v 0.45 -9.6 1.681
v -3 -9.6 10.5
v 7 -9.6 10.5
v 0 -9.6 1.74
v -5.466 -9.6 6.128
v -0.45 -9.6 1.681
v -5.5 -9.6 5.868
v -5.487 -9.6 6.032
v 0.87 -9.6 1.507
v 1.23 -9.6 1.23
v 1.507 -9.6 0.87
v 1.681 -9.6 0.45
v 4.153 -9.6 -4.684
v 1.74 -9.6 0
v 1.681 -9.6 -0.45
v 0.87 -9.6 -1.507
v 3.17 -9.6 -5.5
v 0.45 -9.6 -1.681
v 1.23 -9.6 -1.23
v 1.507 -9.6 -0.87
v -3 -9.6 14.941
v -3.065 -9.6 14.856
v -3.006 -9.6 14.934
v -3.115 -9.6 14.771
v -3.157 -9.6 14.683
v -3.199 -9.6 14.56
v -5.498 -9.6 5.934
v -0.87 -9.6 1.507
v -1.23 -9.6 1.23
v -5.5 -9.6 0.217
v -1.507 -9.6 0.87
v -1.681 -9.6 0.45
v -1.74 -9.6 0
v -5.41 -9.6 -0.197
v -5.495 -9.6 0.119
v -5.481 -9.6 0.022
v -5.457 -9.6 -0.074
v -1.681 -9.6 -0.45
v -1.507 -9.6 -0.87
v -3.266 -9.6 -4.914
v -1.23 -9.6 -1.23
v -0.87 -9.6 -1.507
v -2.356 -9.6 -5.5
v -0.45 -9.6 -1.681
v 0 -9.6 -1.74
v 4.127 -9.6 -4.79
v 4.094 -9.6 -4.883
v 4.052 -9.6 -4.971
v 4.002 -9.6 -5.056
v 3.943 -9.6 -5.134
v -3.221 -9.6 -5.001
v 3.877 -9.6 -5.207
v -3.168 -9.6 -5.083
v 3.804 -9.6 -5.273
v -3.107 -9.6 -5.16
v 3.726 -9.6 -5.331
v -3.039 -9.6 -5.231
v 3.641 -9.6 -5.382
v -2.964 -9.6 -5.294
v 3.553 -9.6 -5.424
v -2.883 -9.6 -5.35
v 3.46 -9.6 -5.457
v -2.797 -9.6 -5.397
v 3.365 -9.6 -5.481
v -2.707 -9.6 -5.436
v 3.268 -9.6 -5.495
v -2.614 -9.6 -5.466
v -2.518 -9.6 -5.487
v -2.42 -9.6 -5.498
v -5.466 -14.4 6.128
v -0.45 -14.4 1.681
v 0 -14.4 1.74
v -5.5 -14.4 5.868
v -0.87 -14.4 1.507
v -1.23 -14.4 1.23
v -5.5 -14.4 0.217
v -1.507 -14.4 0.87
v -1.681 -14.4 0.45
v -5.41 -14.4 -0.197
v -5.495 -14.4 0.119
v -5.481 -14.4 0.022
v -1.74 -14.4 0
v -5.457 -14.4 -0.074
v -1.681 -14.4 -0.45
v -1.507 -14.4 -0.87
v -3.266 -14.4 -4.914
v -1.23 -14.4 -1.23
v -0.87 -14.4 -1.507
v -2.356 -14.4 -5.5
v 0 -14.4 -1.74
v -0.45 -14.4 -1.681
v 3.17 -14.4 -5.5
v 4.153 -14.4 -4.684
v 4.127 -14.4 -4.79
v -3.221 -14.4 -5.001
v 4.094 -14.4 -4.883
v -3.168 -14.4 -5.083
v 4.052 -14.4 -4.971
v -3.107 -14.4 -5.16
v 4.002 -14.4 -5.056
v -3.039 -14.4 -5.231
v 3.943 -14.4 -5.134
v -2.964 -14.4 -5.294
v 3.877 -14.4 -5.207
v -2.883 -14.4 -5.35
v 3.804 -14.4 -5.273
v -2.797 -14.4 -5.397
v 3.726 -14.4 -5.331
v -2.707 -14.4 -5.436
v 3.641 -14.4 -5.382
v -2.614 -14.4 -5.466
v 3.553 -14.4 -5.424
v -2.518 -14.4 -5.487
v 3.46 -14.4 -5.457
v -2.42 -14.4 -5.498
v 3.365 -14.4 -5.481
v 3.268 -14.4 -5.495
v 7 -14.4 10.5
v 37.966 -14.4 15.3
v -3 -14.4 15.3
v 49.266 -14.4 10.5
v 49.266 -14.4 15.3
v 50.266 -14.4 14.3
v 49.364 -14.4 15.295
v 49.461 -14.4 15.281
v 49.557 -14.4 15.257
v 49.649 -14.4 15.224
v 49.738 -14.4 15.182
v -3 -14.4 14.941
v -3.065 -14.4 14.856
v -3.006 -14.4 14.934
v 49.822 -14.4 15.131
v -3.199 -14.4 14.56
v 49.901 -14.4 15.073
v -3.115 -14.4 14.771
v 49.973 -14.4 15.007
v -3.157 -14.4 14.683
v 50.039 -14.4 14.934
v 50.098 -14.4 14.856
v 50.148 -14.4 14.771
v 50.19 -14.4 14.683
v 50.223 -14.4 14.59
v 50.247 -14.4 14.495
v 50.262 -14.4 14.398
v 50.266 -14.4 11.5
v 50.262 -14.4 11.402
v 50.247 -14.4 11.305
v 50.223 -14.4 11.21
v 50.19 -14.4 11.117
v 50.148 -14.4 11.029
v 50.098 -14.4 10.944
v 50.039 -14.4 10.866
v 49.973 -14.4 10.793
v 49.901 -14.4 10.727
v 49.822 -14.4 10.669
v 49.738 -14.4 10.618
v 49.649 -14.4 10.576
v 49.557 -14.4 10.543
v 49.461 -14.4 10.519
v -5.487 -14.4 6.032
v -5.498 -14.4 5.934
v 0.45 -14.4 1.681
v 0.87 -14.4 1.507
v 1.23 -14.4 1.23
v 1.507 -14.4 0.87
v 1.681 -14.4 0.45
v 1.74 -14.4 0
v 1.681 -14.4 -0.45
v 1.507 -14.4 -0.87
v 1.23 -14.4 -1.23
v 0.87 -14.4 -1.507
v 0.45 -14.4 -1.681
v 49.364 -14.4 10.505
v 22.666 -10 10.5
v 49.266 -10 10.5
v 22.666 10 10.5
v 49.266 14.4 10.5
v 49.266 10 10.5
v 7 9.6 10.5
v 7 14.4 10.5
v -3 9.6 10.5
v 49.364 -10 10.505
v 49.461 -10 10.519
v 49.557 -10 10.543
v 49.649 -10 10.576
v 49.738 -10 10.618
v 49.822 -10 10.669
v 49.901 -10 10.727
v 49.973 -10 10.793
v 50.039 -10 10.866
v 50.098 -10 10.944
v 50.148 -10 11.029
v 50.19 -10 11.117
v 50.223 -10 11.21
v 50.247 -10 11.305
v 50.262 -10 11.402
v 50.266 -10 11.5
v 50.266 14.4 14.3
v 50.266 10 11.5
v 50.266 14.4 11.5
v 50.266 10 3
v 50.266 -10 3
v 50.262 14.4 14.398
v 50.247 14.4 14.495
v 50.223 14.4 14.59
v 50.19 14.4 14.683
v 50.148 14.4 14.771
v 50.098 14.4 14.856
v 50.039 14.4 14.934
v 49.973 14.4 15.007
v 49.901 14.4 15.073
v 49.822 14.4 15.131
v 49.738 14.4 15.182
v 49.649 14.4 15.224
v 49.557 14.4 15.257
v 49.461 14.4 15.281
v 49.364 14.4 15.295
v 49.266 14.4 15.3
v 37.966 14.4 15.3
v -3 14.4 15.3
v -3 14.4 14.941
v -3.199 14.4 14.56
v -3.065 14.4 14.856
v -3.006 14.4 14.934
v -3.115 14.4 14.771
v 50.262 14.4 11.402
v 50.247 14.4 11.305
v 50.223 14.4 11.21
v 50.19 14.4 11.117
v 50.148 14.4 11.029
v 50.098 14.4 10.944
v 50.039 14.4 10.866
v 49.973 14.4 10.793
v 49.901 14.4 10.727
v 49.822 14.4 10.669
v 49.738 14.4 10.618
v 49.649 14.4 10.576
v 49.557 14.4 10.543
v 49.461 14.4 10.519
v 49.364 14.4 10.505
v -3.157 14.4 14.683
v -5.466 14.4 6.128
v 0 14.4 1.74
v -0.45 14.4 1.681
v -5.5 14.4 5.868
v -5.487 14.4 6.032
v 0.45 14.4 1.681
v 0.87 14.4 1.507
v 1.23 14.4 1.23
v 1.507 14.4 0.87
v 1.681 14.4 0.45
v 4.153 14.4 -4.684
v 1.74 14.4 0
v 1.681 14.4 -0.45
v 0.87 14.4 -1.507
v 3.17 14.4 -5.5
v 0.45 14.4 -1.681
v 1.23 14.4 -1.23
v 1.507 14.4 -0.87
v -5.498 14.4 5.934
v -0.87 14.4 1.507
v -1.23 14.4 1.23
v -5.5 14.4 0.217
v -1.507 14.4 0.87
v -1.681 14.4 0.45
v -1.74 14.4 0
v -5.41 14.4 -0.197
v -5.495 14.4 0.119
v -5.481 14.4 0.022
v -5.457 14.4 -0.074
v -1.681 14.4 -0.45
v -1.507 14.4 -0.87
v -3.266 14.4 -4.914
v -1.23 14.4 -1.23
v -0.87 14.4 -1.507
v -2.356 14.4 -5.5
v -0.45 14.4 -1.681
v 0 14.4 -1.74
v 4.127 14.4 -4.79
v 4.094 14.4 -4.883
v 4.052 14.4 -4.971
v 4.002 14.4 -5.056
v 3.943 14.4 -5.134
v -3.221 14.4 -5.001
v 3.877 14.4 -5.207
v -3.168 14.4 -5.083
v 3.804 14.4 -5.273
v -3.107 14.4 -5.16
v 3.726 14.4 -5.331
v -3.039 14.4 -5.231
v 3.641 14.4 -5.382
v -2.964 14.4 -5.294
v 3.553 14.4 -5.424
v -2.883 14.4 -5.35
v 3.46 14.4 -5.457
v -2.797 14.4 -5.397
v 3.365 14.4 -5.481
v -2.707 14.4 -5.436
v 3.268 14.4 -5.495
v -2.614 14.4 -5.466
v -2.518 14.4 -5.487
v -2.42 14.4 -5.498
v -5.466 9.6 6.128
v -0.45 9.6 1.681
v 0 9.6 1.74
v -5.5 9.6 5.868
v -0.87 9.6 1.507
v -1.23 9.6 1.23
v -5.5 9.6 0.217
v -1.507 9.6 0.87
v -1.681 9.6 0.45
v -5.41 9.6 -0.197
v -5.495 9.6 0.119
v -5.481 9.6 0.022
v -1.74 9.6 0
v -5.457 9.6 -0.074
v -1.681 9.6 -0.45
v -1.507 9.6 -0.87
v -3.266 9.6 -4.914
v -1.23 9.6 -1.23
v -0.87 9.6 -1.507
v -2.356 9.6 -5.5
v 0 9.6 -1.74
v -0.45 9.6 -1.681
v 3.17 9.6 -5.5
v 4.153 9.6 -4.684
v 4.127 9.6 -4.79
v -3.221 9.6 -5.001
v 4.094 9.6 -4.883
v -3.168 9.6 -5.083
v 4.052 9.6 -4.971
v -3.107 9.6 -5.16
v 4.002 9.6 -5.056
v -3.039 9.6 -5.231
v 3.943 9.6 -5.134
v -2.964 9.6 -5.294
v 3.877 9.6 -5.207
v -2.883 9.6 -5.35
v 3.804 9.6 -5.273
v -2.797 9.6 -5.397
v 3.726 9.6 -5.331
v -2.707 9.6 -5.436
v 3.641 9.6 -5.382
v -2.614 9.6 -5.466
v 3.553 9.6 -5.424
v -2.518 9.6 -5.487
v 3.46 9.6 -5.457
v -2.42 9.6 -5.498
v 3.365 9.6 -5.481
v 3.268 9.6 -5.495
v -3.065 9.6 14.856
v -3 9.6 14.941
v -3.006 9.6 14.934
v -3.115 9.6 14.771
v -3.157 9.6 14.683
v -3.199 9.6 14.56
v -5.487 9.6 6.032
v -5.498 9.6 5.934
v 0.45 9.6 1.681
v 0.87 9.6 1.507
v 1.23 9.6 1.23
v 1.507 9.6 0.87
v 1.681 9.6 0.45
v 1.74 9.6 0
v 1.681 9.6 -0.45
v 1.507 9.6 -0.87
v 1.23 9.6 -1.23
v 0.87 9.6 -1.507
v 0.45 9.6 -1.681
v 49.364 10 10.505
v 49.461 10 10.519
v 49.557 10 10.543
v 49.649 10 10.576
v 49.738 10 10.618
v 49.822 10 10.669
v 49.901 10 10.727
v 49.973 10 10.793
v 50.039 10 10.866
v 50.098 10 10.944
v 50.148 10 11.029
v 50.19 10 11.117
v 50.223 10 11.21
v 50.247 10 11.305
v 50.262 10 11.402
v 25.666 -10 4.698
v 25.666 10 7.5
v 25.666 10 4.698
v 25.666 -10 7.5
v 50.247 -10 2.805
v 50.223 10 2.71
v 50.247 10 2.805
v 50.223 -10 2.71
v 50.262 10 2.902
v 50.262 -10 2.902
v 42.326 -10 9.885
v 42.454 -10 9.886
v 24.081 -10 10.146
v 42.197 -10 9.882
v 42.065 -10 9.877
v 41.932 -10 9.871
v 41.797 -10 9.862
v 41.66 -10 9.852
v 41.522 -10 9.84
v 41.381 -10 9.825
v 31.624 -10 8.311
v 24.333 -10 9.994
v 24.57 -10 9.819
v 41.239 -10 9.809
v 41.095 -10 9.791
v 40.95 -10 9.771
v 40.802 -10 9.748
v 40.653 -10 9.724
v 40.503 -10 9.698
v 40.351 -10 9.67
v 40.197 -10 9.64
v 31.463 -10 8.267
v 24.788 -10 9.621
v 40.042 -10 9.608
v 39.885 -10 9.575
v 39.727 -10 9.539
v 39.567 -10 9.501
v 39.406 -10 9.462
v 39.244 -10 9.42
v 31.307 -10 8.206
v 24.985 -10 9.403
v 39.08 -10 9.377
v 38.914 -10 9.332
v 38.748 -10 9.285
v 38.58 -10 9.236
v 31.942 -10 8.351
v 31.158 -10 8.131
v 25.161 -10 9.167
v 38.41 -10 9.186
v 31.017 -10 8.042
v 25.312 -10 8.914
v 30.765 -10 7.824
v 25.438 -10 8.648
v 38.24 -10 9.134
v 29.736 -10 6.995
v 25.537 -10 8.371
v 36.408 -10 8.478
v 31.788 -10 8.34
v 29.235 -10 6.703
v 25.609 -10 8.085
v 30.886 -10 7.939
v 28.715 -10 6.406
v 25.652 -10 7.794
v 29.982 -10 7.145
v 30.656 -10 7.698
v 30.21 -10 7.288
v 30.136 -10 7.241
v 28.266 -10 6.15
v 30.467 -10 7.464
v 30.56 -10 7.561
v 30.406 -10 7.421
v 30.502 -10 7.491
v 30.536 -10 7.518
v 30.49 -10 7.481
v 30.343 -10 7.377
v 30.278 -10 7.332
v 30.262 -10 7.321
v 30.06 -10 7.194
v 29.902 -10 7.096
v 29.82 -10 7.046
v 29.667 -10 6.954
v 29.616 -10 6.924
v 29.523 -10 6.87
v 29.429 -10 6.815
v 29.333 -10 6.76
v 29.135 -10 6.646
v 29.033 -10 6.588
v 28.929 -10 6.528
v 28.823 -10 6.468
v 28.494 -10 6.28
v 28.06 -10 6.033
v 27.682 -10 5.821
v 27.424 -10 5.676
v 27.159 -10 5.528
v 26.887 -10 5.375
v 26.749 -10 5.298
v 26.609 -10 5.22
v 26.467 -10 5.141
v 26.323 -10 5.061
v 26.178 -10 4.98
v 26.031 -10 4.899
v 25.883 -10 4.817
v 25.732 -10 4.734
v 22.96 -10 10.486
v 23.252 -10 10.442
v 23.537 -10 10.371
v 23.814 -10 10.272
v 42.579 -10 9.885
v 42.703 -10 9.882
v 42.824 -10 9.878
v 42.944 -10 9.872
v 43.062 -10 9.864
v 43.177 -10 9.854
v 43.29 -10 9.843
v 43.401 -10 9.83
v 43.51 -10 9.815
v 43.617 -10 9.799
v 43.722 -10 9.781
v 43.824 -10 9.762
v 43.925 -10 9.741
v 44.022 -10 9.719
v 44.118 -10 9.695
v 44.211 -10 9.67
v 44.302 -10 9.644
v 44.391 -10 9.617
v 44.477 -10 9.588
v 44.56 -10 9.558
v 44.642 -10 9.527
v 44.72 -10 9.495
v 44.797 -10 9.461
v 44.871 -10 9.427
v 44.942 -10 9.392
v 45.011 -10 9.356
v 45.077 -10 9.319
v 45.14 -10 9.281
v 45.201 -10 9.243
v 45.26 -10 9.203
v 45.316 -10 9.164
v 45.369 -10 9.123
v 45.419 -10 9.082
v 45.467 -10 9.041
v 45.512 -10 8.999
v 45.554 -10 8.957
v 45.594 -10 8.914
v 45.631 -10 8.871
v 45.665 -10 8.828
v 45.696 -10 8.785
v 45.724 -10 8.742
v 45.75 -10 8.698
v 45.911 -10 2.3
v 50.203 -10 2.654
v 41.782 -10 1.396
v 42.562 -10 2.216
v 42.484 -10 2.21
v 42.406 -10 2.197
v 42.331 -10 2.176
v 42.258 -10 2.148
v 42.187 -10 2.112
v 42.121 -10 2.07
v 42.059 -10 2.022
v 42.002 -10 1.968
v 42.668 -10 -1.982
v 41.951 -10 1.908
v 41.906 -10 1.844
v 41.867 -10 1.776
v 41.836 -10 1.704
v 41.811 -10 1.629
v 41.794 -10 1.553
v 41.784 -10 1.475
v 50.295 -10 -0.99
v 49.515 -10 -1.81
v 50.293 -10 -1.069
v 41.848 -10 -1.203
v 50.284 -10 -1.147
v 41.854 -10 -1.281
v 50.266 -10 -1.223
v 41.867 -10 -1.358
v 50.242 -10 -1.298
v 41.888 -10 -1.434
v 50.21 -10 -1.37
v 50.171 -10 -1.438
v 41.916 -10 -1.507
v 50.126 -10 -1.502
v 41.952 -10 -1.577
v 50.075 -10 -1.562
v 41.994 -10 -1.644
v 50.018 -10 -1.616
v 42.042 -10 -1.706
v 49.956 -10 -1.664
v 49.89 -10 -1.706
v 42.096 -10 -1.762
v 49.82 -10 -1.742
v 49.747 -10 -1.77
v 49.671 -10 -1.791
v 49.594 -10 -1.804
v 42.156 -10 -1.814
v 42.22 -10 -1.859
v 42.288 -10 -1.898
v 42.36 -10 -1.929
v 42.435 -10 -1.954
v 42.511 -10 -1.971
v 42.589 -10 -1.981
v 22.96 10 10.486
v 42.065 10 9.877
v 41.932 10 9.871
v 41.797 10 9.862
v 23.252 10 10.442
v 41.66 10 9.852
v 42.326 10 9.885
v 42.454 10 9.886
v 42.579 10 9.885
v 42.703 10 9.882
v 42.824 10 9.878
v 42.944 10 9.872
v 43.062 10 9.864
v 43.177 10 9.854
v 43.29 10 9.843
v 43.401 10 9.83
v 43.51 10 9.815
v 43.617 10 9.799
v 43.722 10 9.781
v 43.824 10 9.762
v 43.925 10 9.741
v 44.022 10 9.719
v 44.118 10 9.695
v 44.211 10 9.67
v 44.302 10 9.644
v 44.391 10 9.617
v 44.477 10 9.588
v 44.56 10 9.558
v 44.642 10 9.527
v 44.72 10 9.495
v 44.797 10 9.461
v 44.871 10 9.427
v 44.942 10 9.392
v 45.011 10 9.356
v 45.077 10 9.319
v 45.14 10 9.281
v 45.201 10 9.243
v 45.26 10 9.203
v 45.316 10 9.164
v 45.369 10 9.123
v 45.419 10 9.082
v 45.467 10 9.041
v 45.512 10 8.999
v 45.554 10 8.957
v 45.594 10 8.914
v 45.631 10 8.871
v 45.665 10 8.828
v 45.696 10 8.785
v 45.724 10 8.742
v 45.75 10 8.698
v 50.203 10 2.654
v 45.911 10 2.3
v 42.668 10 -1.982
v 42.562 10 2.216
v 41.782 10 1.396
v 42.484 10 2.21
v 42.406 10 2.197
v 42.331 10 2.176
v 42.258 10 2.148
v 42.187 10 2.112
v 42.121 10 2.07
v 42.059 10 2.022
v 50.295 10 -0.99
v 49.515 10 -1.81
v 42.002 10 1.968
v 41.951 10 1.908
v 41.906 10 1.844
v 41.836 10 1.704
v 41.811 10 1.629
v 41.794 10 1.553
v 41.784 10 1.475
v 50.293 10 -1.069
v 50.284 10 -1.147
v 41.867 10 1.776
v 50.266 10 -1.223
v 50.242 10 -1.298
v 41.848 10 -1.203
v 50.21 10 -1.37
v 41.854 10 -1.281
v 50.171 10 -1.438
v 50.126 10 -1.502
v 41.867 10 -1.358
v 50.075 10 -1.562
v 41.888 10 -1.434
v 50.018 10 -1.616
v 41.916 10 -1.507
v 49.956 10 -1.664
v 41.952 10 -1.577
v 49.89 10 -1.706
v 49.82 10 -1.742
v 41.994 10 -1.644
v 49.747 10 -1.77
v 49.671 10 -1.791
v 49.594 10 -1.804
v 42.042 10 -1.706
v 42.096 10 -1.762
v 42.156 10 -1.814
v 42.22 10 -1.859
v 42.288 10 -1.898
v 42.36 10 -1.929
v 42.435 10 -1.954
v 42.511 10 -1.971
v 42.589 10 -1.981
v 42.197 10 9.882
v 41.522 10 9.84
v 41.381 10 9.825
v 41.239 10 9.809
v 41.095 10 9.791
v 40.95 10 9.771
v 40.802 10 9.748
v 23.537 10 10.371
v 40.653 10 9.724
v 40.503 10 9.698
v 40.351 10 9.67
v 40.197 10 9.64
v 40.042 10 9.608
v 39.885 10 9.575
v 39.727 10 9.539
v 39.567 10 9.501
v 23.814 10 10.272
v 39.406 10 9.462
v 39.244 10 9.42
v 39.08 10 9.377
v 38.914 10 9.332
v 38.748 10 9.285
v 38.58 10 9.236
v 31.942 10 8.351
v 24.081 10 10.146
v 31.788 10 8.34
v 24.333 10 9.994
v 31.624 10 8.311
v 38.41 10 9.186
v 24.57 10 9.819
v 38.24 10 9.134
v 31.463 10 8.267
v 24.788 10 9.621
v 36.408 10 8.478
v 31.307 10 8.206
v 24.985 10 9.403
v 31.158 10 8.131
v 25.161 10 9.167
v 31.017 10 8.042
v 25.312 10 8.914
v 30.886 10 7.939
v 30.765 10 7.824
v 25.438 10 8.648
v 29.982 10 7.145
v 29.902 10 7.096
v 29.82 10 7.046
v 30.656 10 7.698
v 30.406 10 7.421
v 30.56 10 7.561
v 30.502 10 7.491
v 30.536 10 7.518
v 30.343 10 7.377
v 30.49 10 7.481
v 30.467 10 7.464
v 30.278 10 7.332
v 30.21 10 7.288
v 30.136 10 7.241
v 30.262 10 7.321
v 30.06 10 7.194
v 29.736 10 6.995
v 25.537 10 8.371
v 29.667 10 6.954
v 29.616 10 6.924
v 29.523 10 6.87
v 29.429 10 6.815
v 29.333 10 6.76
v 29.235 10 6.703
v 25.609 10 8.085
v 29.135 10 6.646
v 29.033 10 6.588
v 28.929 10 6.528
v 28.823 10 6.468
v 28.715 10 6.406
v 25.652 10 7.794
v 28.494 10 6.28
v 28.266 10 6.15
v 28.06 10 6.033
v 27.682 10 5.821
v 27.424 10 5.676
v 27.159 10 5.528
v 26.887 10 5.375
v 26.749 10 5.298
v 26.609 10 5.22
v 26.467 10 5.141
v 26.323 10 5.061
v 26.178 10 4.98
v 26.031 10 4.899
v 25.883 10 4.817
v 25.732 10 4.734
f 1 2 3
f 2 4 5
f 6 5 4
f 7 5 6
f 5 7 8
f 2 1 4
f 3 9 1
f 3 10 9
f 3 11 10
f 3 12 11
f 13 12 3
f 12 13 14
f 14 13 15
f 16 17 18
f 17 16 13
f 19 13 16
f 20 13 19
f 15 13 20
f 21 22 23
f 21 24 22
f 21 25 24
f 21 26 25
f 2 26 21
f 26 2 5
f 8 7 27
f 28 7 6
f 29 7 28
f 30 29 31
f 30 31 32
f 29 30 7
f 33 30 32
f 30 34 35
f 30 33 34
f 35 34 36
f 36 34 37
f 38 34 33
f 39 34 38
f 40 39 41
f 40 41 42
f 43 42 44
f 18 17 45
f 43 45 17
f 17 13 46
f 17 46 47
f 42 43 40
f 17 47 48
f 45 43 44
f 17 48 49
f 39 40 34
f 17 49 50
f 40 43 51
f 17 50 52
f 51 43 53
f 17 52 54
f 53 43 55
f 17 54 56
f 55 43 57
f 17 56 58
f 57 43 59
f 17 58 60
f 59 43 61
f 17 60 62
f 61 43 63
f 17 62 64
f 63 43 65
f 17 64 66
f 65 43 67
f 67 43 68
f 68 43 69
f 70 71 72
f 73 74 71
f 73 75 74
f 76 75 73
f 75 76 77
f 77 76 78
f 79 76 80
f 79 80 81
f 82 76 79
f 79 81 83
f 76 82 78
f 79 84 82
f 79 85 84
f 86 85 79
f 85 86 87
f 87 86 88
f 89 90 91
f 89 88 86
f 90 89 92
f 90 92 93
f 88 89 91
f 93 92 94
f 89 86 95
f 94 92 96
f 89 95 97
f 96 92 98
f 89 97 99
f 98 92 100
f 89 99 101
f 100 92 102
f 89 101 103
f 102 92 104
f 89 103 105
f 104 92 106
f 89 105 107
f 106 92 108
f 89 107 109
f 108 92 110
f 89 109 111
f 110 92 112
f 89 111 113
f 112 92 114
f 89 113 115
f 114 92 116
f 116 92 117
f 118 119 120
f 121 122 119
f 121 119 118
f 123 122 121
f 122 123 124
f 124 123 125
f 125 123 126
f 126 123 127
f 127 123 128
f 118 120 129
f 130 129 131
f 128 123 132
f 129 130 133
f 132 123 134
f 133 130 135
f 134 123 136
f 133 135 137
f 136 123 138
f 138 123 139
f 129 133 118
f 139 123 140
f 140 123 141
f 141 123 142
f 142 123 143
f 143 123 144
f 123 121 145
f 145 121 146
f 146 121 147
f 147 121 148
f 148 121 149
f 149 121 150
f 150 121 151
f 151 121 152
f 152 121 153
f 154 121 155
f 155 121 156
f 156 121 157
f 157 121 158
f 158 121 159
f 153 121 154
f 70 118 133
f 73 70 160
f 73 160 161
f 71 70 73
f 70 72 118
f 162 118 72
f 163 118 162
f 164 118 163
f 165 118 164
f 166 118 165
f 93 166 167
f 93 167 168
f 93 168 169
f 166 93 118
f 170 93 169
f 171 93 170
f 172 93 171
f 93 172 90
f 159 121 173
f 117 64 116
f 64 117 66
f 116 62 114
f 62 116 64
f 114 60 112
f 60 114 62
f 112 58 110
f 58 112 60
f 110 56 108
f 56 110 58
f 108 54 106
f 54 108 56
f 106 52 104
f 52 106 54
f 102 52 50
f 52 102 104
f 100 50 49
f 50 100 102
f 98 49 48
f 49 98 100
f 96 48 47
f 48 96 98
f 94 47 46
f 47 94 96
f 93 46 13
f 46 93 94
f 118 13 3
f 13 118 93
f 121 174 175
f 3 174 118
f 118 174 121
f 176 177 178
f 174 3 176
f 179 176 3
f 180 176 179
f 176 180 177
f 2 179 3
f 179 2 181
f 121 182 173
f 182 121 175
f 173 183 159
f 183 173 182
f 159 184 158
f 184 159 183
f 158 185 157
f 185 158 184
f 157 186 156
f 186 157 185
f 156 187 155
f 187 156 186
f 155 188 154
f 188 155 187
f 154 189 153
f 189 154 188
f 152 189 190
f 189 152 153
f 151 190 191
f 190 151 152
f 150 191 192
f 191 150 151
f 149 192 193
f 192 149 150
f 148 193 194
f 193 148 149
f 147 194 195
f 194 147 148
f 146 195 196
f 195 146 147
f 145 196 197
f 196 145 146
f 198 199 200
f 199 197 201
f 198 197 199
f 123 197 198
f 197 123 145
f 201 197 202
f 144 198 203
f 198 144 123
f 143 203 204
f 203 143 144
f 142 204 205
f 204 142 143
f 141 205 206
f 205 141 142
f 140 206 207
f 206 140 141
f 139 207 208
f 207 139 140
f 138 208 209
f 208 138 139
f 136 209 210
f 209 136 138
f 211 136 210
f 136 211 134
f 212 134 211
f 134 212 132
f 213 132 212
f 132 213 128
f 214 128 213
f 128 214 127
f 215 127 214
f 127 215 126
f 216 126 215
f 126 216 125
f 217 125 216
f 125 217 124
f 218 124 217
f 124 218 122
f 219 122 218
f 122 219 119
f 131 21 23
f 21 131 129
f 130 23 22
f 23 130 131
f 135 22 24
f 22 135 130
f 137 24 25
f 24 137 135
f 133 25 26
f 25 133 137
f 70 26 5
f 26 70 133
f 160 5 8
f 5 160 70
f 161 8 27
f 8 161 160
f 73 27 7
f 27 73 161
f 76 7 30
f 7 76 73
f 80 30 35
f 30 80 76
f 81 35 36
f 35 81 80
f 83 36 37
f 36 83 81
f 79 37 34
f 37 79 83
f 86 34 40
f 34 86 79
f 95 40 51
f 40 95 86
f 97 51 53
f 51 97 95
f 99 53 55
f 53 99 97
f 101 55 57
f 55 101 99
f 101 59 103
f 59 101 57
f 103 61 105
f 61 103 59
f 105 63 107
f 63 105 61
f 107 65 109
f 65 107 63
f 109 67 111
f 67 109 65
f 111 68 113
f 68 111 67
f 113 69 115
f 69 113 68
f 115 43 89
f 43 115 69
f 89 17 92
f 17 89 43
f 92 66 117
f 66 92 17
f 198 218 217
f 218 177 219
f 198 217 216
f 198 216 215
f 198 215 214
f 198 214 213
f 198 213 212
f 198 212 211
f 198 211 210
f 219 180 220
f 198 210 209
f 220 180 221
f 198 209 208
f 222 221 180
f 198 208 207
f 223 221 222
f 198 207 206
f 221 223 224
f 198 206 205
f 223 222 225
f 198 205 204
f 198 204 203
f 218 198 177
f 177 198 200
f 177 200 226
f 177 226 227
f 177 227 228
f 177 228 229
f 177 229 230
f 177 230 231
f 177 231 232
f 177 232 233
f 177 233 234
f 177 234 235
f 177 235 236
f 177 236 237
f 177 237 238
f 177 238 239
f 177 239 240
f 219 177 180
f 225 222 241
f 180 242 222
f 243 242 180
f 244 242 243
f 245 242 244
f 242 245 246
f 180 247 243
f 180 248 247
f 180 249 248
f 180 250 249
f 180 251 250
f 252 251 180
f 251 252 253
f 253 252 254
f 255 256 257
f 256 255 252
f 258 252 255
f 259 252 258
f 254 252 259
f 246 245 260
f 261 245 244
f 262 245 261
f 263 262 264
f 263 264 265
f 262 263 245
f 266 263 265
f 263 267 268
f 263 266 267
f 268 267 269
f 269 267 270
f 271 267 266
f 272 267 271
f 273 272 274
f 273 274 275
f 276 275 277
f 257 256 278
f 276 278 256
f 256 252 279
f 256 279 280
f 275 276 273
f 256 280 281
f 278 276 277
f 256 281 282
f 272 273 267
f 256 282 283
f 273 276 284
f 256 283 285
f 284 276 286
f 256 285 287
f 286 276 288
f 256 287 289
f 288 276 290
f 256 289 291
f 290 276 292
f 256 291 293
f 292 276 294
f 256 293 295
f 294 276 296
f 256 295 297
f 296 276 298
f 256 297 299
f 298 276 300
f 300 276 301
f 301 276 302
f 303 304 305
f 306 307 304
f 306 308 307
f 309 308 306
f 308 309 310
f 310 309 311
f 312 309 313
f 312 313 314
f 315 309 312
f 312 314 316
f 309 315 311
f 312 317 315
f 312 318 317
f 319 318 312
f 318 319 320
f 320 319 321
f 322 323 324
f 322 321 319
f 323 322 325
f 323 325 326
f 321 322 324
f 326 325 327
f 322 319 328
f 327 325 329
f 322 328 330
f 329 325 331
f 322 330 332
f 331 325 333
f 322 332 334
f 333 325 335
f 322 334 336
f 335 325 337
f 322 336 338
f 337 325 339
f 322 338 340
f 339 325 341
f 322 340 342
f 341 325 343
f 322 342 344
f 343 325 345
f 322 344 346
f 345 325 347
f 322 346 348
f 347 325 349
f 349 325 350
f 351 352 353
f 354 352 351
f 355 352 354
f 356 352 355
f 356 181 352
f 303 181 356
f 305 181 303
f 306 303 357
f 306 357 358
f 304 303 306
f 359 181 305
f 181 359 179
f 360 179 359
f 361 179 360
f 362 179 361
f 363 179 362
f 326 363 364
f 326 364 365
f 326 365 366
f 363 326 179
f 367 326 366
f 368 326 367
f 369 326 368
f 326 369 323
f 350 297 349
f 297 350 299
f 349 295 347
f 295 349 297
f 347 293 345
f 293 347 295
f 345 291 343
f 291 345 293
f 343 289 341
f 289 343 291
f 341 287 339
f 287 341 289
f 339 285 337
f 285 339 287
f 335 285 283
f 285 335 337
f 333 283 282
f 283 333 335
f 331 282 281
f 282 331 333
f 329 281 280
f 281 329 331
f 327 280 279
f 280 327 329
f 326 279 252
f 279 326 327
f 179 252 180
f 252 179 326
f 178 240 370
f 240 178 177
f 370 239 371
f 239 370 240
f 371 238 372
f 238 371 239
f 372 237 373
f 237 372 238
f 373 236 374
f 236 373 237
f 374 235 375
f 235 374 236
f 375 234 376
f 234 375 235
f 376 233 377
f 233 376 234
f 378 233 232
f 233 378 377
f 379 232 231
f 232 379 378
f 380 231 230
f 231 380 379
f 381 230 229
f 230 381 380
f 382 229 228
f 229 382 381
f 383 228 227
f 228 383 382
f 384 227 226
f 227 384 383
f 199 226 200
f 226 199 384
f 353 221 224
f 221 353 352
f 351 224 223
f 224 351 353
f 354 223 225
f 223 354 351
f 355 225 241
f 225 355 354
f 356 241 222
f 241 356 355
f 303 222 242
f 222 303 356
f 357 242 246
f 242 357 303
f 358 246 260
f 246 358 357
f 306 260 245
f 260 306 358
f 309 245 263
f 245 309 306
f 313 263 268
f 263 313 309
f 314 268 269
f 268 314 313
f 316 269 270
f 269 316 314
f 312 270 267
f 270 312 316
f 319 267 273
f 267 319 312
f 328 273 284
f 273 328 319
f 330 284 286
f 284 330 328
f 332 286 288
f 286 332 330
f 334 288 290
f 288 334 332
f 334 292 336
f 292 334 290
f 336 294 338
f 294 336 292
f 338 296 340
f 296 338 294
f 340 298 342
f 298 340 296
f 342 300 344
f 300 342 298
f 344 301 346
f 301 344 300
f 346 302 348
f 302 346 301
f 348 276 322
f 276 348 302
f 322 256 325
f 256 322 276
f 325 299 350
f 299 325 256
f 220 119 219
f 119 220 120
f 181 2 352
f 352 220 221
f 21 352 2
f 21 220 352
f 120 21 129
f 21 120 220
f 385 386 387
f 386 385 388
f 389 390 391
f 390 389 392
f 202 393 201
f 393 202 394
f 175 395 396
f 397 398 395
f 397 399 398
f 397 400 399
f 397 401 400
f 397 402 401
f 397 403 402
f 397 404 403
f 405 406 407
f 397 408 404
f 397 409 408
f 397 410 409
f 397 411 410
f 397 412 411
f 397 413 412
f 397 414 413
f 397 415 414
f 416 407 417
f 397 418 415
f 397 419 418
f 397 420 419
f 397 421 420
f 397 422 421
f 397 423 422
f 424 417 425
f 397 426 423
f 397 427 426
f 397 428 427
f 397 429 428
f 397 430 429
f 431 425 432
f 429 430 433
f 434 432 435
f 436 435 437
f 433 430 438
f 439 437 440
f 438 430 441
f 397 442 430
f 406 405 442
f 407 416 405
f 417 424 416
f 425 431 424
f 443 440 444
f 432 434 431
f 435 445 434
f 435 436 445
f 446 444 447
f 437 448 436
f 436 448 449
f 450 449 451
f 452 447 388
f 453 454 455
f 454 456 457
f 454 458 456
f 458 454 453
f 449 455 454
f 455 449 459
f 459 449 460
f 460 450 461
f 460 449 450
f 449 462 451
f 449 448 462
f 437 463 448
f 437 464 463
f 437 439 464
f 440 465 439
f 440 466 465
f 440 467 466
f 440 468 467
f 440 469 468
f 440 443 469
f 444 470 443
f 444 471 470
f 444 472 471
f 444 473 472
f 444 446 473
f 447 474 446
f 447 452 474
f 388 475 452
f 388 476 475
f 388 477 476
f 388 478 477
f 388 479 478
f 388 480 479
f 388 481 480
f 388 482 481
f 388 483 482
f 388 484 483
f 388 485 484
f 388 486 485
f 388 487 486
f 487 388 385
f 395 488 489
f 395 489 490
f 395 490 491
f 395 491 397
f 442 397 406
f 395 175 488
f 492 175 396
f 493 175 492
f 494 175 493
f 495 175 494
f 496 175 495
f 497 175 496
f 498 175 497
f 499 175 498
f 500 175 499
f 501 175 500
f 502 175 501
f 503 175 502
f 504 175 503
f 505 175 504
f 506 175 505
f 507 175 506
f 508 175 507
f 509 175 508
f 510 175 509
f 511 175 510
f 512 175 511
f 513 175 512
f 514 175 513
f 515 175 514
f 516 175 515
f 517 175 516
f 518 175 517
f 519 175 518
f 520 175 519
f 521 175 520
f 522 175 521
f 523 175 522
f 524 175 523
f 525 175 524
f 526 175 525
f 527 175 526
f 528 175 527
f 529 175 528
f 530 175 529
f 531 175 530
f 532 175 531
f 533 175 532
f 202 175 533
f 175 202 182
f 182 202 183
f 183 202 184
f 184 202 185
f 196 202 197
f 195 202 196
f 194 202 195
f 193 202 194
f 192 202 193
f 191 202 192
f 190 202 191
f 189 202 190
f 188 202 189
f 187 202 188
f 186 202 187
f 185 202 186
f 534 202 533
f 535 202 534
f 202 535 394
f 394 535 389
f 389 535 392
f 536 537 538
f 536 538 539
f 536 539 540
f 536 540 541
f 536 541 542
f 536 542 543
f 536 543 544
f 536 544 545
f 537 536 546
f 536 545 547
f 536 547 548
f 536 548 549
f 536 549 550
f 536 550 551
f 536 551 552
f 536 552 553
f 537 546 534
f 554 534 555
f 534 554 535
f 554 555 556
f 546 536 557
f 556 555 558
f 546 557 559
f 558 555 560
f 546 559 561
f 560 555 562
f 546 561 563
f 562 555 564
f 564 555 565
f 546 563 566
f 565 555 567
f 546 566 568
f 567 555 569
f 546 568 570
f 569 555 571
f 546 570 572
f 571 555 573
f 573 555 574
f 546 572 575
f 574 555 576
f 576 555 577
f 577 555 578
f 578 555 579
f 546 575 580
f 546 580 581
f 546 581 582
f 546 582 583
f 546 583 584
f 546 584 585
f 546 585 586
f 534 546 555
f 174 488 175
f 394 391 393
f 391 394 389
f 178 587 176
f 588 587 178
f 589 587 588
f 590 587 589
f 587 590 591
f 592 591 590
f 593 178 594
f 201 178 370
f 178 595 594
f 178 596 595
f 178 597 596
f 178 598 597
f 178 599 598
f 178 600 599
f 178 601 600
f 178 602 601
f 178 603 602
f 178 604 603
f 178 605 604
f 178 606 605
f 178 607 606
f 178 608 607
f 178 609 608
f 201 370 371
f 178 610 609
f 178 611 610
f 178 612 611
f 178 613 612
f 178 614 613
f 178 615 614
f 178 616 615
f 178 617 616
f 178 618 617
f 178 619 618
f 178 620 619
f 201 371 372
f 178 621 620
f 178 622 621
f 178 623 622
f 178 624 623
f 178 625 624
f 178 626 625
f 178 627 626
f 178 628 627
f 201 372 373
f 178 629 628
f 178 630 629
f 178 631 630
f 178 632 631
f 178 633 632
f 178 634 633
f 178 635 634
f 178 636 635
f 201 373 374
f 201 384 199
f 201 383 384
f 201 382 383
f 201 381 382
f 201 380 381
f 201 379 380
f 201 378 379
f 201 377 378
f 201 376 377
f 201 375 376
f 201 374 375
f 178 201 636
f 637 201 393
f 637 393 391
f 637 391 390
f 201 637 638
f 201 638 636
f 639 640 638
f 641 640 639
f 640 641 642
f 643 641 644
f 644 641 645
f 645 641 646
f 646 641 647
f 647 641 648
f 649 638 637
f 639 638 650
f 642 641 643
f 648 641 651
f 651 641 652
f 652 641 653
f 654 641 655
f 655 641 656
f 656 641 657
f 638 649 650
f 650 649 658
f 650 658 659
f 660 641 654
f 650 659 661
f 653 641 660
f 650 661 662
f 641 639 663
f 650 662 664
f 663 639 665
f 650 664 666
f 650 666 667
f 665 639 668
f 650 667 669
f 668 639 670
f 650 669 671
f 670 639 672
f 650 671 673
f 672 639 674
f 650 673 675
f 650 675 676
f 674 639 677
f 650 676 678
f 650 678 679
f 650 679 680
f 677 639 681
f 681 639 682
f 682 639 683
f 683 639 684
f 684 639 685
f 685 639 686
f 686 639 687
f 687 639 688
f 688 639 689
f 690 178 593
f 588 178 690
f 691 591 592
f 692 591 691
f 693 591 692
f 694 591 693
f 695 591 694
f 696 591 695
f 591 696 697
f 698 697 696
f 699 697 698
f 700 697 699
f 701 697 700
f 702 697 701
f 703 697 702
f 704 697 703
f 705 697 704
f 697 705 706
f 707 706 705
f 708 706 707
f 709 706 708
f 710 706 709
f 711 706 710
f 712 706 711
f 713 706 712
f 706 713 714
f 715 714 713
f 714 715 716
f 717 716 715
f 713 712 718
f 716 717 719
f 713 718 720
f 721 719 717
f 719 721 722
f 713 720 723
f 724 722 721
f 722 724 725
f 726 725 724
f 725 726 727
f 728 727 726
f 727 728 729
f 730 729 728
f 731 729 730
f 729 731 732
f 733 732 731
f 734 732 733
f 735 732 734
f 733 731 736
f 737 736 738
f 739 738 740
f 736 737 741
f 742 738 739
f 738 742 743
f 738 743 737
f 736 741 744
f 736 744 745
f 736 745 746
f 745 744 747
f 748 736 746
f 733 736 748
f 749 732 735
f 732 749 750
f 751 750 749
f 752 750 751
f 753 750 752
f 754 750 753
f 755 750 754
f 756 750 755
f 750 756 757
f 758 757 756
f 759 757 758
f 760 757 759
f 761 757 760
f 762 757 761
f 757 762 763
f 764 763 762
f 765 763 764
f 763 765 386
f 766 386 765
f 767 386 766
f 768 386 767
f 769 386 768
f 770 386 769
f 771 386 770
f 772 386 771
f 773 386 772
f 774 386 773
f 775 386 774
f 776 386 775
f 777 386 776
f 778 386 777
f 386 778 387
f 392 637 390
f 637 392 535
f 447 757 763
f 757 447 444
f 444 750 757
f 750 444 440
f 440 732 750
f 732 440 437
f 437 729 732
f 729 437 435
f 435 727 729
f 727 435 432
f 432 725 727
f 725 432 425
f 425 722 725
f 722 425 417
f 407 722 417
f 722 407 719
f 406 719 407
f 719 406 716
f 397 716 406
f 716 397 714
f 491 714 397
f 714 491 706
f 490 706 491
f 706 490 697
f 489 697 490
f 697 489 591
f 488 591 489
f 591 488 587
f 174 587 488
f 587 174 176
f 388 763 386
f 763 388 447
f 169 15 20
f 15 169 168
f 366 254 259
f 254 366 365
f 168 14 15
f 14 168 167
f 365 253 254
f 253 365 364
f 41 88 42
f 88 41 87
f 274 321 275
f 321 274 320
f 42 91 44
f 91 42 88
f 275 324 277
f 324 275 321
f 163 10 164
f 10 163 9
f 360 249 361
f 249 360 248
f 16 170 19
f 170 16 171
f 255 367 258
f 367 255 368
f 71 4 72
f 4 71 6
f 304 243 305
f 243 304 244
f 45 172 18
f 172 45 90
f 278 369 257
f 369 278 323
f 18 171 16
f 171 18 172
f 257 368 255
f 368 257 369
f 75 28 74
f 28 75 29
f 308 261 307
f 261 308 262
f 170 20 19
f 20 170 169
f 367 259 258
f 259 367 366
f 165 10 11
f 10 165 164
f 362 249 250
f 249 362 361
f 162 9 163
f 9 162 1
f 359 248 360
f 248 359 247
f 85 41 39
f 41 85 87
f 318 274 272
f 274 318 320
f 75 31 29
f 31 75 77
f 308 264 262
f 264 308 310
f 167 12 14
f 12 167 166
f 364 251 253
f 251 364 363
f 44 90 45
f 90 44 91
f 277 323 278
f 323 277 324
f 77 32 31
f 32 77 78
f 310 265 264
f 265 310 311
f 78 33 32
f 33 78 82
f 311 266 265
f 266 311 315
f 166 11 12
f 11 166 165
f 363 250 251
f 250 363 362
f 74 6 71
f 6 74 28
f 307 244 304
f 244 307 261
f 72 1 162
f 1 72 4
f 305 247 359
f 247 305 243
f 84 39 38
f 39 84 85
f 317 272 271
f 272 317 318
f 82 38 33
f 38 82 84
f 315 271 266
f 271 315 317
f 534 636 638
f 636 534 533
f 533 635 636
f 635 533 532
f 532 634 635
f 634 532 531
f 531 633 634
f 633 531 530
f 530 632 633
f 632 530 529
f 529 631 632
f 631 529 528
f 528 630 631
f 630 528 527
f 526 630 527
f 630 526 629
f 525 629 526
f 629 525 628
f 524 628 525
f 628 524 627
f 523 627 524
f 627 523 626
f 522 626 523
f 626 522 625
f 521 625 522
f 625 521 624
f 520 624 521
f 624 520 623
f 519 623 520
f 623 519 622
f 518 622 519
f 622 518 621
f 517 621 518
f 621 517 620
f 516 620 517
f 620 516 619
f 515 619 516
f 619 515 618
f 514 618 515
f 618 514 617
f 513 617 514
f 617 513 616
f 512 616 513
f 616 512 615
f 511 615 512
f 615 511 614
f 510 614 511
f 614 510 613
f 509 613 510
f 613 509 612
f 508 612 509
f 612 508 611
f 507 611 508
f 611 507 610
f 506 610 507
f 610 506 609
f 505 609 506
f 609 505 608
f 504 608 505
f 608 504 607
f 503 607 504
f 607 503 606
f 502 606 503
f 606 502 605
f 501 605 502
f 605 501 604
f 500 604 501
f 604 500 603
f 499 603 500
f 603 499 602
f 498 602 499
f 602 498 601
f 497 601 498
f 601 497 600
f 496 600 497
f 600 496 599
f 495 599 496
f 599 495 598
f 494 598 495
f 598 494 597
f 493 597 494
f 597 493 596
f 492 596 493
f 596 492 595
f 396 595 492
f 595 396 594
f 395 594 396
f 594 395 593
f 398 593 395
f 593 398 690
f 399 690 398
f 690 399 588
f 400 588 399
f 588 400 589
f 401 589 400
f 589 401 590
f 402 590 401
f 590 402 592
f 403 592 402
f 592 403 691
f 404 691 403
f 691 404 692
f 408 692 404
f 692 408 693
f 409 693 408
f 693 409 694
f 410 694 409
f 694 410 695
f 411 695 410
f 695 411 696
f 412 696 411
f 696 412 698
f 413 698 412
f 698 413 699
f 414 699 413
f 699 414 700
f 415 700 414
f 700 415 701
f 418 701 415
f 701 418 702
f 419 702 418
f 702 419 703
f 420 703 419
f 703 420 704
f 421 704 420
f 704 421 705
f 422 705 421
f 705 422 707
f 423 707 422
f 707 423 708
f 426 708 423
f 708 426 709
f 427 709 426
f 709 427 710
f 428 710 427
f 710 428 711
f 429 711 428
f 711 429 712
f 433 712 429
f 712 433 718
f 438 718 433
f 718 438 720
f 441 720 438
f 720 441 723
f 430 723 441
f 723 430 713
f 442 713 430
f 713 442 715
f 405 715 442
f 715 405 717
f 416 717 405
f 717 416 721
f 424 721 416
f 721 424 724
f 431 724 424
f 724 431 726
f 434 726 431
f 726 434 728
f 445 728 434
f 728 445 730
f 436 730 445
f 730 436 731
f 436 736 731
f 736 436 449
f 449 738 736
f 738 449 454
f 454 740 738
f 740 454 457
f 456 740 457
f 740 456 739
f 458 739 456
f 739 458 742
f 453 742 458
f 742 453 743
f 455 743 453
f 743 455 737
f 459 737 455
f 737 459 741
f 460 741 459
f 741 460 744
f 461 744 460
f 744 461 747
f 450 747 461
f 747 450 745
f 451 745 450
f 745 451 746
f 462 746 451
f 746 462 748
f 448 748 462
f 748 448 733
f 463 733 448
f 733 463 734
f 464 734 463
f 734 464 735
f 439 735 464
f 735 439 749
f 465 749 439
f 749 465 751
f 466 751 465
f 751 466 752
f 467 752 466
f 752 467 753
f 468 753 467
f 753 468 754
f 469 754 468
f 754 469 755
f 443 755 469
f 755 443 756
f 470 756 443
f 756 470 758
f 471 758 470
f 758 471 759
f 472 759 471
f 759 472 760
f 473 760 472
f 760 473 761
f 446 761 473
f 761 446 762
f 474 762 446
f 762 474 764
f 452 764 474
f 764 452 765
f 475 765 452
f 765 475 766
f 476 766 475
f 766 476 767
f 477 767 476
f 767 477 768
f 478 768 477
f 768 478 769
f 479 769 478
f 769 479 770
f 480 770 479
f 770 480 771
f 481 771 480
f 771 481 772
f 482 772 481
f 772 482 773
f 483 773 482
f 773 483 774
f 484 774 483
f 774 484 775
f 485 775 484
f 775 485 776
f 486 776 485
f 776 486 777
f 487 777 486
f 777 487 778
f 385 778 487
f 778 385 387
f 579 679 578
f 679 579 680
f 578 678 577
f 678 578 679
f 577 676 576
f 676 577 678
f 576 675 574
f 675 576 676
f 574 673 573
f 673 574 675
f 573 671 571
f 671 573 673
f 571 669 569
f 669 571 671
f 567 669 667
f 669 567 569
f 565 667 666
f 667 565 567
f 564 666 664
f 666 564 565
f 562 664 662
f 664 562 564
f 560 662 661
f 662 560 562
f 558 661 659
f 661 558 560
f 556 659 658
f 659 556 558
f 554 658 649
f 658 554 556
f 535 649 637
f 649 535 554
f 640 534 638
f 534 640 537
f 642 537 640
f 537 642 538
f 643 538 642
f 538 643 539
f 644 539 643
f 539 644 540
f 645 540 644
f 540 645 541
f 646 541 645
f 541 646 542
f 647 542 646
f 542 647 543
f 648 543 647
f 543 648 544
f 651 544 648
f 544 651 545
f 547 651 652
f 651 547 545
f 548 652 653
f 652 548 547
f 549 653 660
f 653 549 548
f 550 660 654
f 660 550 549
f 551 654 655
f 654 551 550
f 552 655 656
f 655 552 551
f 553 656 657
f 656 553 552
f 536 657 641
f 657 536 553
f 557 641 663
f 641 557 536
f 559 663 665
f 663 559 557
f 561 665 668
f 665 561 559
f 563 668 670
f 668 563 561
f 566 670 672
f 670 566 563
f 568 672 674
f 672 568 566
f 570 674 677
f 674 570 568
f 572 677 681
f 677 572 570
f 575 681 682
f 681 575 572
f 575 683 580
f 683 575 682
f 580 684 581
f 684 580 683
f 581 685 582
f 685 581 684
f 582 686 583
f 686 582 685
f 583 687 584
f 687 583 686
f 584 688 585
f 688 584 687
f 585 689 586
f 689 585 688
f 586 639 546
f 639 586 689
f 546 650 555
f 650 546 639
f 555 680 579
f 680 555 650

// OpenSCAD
// Photo-inspired reusable draw latch; NOT a DJI replacement part. mm.
// All dimensions provisional. Bambu Lab PETG Basic prototype; metal M3 axles.
use <../../../../scad/lib/util.scad>
/* [Output] */
part = "lever"; // [base,link,lever,keeper,epdm,axle_a,axle_b,assembly,open]
/* [Interface dimensions - provisional] */
link_length = 12;
closed_angle = 185;
catch_distance = 26;
axis_height = 10.5;
pad_thickness = 5;
pad_width = 46;
base_left = -17;
base_right = 9;
keeper_left = -16;
keeper_right = 3; // Cavity back is flush with the mounting plate edge.
keeper_pad_width = 48;
mount_y = 18;
keeper_mount_x = -12;
keeper_mount_x2 = -4;
keeper_mount_y = 19;
mount_d = 3.45;
keeper_adjust = 1.5;
/* [Moving parts] */
center_width = 8;
link_thickness = 4.8;
cheek_thickness = 4.8;
side_gap = 0.4;
eye_radius = 5.5;
roof_bottom = 10.5;
roof_thickness = 4.8;
hook_wall = 4.8;
hook_width = 20;
hook_depth = -2; // Raise the main jaw belly; separate reinforced toe sits below.
hook_tip_fillet = 2.5;
hook_tip_round = 0.8;
hook_back_clearance = 1;
root_fillet = 3;
lever_fillet = 2.5;
edge_round = 1;
/* [Integral printed keeper] */
catch_height = 8.5;
keeper_height = 16.5; // 4 mm lip above the lined cavity.
keeper_top_round = 1.2;
keeper_ridge_width = 30;
keeper_web_thickness = 14; // Groove leaves a 10 mm solid neck.
keeper_groove_depth = 4;
keeper_groove_bottom = 0; // Open to the plate edge: no floor beneath the hook.
keeper_groove_top = 12.5;
keeper_groove_radius = 3;
hook_toe_bottom = 6.4;
hook_toe_top = 10.6;
release_angle = 115;
/* [EPDM lining the complete FIXED cavity: back, roof and both sides] */
epdm_thickness = 1.0; // User's sheet. Assume solid EPDM; confirm foam/adhesive thickness before use.
epdm_precompression = 0.15; // Nominal closed squeeze, not material certification.
base_relief_thickness = 2.5;
/* [Metal hardware - verify purchased parts] */
axle_d = 3;
axle_hole = 3.45;
catch_clearance = 0.5;
axle_a_length = 25;
axle_b_length = 35;
/* [Hidden] */
$fn=64;
eps=0.02;
link_y = center_width/2+side_gap;
cheek_y = link_y+link_thickness+side_gap;
outer_y = cheek_y+cheek_thickness;
roof_top = roof_bottom+roof_thickness;
catch_r = keeper_web_thickness/2+catch_clearance;
bx = link_length*cos(closed_angle);
bz = link_length*sin(closed_angle);
lever_length = sqrt(pow(catch_distance-bx,2)+pow(catch_height-axis_height-bz,2));
stop_z = axis_height+bz-eye_radius;
epdm_closed_thickness = epdm_thickness-epdm_precompression;
keeper_groove_width = hook_width+2*(epdm_thickness+side_gap);
epdm_width = keeper_groove_width-2*epdm_thickness;
epdm_main_length = keeper_groove_top-keeper_groove_radius
    +PI/2*(keeper_groove_radius-epdm_thickness/2)
    +keeper_groove_depth-keeper_groove_radius;
hook_underlap = keeper_groove_depth-epdm_closed_thickness;
hook_tip_x = keeper_web_thickness/2-hook_underlap;
assert(stop_z>base_relief_thickness && roof_bottom>eye_radius);
assert(epdm_precompression>0 && epdm_precompression<epdm_thickness);
assert(keeper_right==keeper_web_thickness/2-keeper_groove_depth);
assert(keeper_groove_radius>epdm_thickness);
assert(hook_toe_bottom>keeper_groove_bottom && hook_toe_top<keeper_groove_top);
assert(hook_underlap>0 && hook_underlap<keeper_groove_depth);
assert(keeper_ridge_width>hook_width+2*side_gap && keeper_ridge_width<pad_width);
assert(keeper_height>catch_height && catch_height>=pad_thickness+root_fillet);
assert(closed_angle>180 && closed_angle<210);

function latch_b(theta=closed_angle) = [link_length*cos(theta),0,axis_height+link_length*sin(theta)];
function latch_cx(theta=closed_angle) = link_length*cos(theta)+sqrt(lever_length*lever_length-pow(catch_height-axis_height-link_length*sin(theta),2));
function latch_phi(theta=closed_angle) = asin((catch_height-axis_height-link_length*sin(theta))/lever_length);

// XZ profile extruded along +Y. Local 2D Y maps to world Z.
module profile_y(y,t) { translate([0,y+t,0]) rotate([90,0,0]) linear_extrude(t) children(); }
module axle_cut(y,len) { translate([0,y,0]) rotate([-90,0,0]) hole(axle_hole,len,fn=24); }
module rounded_pad(x0,length,width=pad_width) {
    translate([x0,-width/2,0]) box_rounded(length,width,pad_thickness,2,0.3);
}
// Concave circular root fillets, additive, not merely a cosmetic outer round.
module root_haunches(y,t,half=eye_radius,sides=[-1,1]) {
    for(s=sides) scale([s,1,1]) profile_y(y,t)
        difference() {
            translate([half-eps,pad_thickness-eps]) square([root_fillet+eps,root_fillet+eps]);
            translate([half+root_fillet,pad_thickness+root_fillet]) circle(r=root_fillet);
        }
}
module softened_profile() {
    // Close concave corners by adding R2.5 material, then round convex R1 edges.
    offset(r=edge_round) offset(delta=-edge_round)
        offset(delta=-lever_fillet) offset(r=lever_fillet) children();
}
// For host integration use with_pad=false and merge root down to z=0.
module latch_base(with_pad=true,with_holes=true) {
    difference() {
        union() {
            if(with_pad) difference() {
                rounded_pad(base_left,base_right-base_left);
                // Rear relief allows B to sit below the pad top. Mounting strips
                // and the central A bearing keep the full 5 mm mounting pad.
                translate([base_left-eps,-outer_y-0.5,base_relief_thickness])
                    cube([1-base_left+eps,2*(outer_y+0.5),pad_thickness]);
            }
            translate([-eye_radius,-center_width/2,0]) cube([2*eye_radius,center_width,axis_height]);
            translate([0,-center_width/2,axis_height]) rotate([-90,0,0]) cylinder(r=eye_radius,h=center_width);
            root_haunches(-center_width/2,center_width);
            // Closed-position stop: both link eye bottoms rest here.
            translate([base_left,-link_y-link_thickness,0]) cube([-6-base_left,2*(link_y+link_thickness),stop_z]);
        }
        translate([0,0,axis_height]) axle_cut(-center_width/2-eps,center_width+2*eps);
        if(with_pad && with_holes) for(x=[-10,3],y=[-mount_y,mount_y])
            translate([x,y,-eps]) hole(mount_d,pad_thickness+2*eps,fn=24);
    }
}
// A at origin, B at +X. Thickness runs +Y; print with axle holes vertical.
module latch_link() {
    difference() {
        union() {
            profile_y(0,link_thickness) translate([0,-eye_radius]) square([link_length,2*eye_radius]);
            for(x=[0,link_length]) translate([x,0,0]) rotate([-90,0,0]) cylinder(r=eye_radius,h=link_thickness);
        }
        for(x=[0,link_length]) translate([x,0,0]) axle_cut(-eps,link_thickness+2*eps);
    }
}
// Rounded outside profile; underside/root fillets are formed by the groove cut.
module keeper_profile(bottom=0) {
    w=keeper_web_thickness/2;
    offset(r=keeper_top_round) offset(delta=-keeper_top_round)
        translate([-w,bottom]) square([2*w,keeper_height-bottom]);
}
// Swept socket for a FIXED keeper, retaining the reinforced rear jaw.
// The positive retaining toe is added separately after this clearance is cut.
module keeper_socket() {
    intersection() {
        union() for(t=[release_angle:1:closed_angle-1]) hull() for(a=[t,min(t+1,closed_angle)])
            rotate(-latch_phi(a)) translate([catch_distance-latch_cx(a),-catch_height]) union() {
                offset(delta=catch_clearance) keeper_profile(bottom=-30);
                translate([0,-30]) square([keeper_web_thickness/2+hook_back_clearance,
                    keeper_height+catch_clearance+30]);
            }
        // Limit rear clearance so the structural jaw retains its wall thickness.
        rotate(-latch_phi(closed_angle)) translate([-100,-100])
            square([100+keeper_web_thickness/2+hook_back_clearance,200]);
    }
}
// B at origin; catch reference C at +X. U-shaped roof resembles photo lever.
module latch_lever() {
    union() {
    difference() {
        union() {
            for(y=[-outer_y,cheek_y]) profile_y(y,cheek_thickness) softened_profile()
                polygon([[-eye_radius,0],[-3,-eye_radius],[4,-eye_radius],[7,roof_bottom],
                    [lever_length+catch_r+hook_wall,roof_bottom],[lever_length+catch_r+hook_wall,roof_top],
                    [lever_length-4,roof_top],[-3,roof_top],[-eye_radius,6]]);
            translate([-3,-outer_y,roof_bottom]) cube([lever_length+3,2*outer_y,roof_thickness]);
            // Main hook body; positive undercut toe is added below separately.
            profile_y(-hook_width/2,hook_width) softened_profile()
                translate([lever_length-catch_r-hook_wall,-hook_depth])
                    square([2*(catch_r+hook_wall),roof_top+hook_depth]);
            // R3 hook-to-roof gussets in XZ, across the hook width.
            for(s=[-1]) translate([lever_length,0,0]) scale([s,1,1])
                profile_y(-hook_width/2,hook_width) difference() {
                    translate([catch_r+hook_wall-eps,roof_bottom-root_fillet]) square([root_fillet+eps,root_fillet+eps]);
                    translate([catch_r+hook_wall+root_fillet,roof_bottom-root_fillet]) circle(r=root_fillet);
                }
        }
        axle_cut(-outer_y-eps,2*outer_y+2*eps);
        profile_y(-hook_width/2-eps,hook_width+2*eps)
            translate([lever_length,0]) keeper_socket();
    }
    // Positive hook toe, under the keeper ledge. Add AFTER the socket cut so
    // the release clearance cannot erase the retaining feature.
    translate([lever_length,0,0]) rotate([0,latch_phi(closed_angle),0])
        profile_y(-hook_width/2,hook_width)
            offset(r=hook_tip_round) offset(delta=-hook_tip_round)
                offset(delta=-hook_tip_fillet) offset(r=hook_tip_fillet)
                polygon([[hook_tip_x,hook_toe_bottom-catch_height],
                    [catch_r+hook_wall,hook_toe_bottom-catch_height],
                    [catch_r+hook_wall,8],
                    [keeper_web_thickness/2+hook_back_clearance,8],
                    [keeper_web_thickness/2+hook_back_clearance,hook_toe_top-catch_height],
                    [hook_tip_x,hook_toe_top-catch_height]]);
    }
}
// Open-ended cavity profile; bottom rounding is below the mounting plane.
module keeper_groove_profile() {
    offset(r=keeper_groove_radius) offset(delta=-keeper_groove_radius)
        translate([keeper_right,-keeper_groove_radius-1])
            square([keeper_groove_depth+root_fillet+1,
                keeper_groove_top+keeper_groove_radius+1]);
}
module liner_clip() {
    translate([keeper_right,0]) square([keeper_groove_depth,keeper_groove_top]);
}
// Low rectangular ridge: full-width material directly joins the host.
module latch_keeper(with_pad=true,with_holes=true) {
    difference() {
        union() {
            if(with_pad) rounded_pad(keeper_left,keeper_right-keeper_left,keeper_pad_width);
            profile_y(-keeper_ridge_width/2,keeper_ridge_width) keeper_profile();
            root_haunches(-keeper_ridge_width/2,keeper_ridge_width,half=keeper_web_thickness/2,sides=[-1]);
        }
        // Central undercut: solid neck remains, side cheeks resist Y escape.
        profile_y(-keeper_groove_width/2,keeper_groove_width) keeper_groove_profile();
        if(with_pad && with_holes) for(y=[-keeper_mount_y,keeper_mount_y]) {
            // X-adjustable two-hole pattern, deliberately beyond pin supports.
            for(x=[keeper_mount_x,keeper_mount_x2]) hull() for(dx=[-keeper_adjust,keeper_adjust])
                translate([x+dx,y,-eps]) hole(mount_d,pad_thickness+2*eps,fn=24);
        }
    }
}
// Three purchased sheet pieces in KEEPER coordinates. Never print them.
module liner_nominal() {
    // Main bent strip covers the complete back and ceiling, between side sheets.
    profile_y(-epdm_width/2,epdm_width) intersection() {
        liner_clip();
        difference() { keeper_groove_profile(); offset(delta=-epdm_thickness) keeper_groove_profile(); }
    }
    for(y=[-keeper_groove_width/2,epdm_width/2])
        profile_y(y,epdm_thickness) intersection() { liner_clip(); keeper_groove_profile(); }
}
module latch_epdm(theta=closed_angle,free_angle=undef,uncompressed=false) {
    phi=is_undef(free_angle)?latch_phi(theta):free_angle;
    difference() {
        liner_nominal();
        // Geometric installed envelope only, not an elastomer constitutive model.
        if(!uncompressed) translate(latch_b(theta)-[catch_distance,0,0])
            rotate([0,-phi,0]) latch_lever();
    }
}
// Reserved metal envelopes, not printable hardware. Head + shank + nut space.
module metal_axle(span,length) {
    translate([0,-span/2,0]) rotate([-90,0,0]) {
        cylinder(d=axle_d,h=length);
        translate([0,0,-3]) cylinder(d=5.5,h=3);
        translate([0,0,span+0.5]) cylinder(d=6.4,h=4);
    }
}
module latch_assembly(theta=closed_angle,free_angle=undef) {
    b=latch_b(theta);
    phi=is_undef(free_angle)?latch_phi(theta):free_angle;
    color("SlateGray") latch_base();
    color("SteelBlue") translate([catch_distance,0,0]) latch_keeper();
    // Rubber is an envelope, not a constitutive deformation simulation.
    color("SeaGreen") translate([catch_distance,0,0]) latch_epdm(theta,free_angle);
    for(y=[-link_y-link_thickness,link_y]) color("Orange")
        translate([0,y,axis_height]) rotate([0,-theta,0]) latch_link();
    color("DimGray") translate(b) rotate([0,-phi,0]) latch_lever();
    color("Silver") {
        translate([0,0,axis_height]) metal_axle(2*(link_y+link_thickness),axle_a_length);
        translate(b) metal_axle(2*outer_y,axle_b_length);
    }
}
if(part=="base") latch_base();
else if(part=="link") latch_link();
else if(part=="lever") latch_lever();
else if(part=="keeper") latch_keeper();
else if(part=="epdm") latch_epdm();
else if(part=="epdm_nominal") liner_nominal();
else if(part=="epdm_side_template") translate([-keeper_right,0]) intersection() { liner_clip(); keeper_groove_profile(); }
else if(part=="epdm_main_template") square([epdm_main_length,epdm_width]);
else if(part=="axle_a") metal_axle(2*(link_y+link_thickness),axle_a_length);
else if(part=="axle_b") metal_axle(2*outer_y,axle_b_length);
else if(part=="assembly") latch_assembly();
else if(part=="open") latch_assembly(theta=release_angle,free_angle=30);
else if(part=="metrics") echo(METRICS=[link_length,closed_angle,catch_distance,axis_height,link_y,link_thickness,outer_y,keeper_ridge_width,keeper_web_thickness,lever_length,pad_thickness,mount_y,keeper_mount_x,catch_height,axle_a_length,axle_b_length,keeper_height,keeper_top_round,catch_clearance,epdm_thickness,epdm_precompression,epdm_width,keeper_groove_top,0,0,release_angle,keeper_groove_depth,keeper_groove_bottom,keeper_groove_top,hook_underlap,hook_toe_bottom,hook_toe_top,hook_width,hook_tip_fillet,hook_tip_round,keeper_groove_radius,keeper_left,keeper_right,keeper_pad_width,keeper_mount_y,keeper_mount_x2,keeper_groove_width,epdm_main_length]);
else assert(false,"Unknown part");
